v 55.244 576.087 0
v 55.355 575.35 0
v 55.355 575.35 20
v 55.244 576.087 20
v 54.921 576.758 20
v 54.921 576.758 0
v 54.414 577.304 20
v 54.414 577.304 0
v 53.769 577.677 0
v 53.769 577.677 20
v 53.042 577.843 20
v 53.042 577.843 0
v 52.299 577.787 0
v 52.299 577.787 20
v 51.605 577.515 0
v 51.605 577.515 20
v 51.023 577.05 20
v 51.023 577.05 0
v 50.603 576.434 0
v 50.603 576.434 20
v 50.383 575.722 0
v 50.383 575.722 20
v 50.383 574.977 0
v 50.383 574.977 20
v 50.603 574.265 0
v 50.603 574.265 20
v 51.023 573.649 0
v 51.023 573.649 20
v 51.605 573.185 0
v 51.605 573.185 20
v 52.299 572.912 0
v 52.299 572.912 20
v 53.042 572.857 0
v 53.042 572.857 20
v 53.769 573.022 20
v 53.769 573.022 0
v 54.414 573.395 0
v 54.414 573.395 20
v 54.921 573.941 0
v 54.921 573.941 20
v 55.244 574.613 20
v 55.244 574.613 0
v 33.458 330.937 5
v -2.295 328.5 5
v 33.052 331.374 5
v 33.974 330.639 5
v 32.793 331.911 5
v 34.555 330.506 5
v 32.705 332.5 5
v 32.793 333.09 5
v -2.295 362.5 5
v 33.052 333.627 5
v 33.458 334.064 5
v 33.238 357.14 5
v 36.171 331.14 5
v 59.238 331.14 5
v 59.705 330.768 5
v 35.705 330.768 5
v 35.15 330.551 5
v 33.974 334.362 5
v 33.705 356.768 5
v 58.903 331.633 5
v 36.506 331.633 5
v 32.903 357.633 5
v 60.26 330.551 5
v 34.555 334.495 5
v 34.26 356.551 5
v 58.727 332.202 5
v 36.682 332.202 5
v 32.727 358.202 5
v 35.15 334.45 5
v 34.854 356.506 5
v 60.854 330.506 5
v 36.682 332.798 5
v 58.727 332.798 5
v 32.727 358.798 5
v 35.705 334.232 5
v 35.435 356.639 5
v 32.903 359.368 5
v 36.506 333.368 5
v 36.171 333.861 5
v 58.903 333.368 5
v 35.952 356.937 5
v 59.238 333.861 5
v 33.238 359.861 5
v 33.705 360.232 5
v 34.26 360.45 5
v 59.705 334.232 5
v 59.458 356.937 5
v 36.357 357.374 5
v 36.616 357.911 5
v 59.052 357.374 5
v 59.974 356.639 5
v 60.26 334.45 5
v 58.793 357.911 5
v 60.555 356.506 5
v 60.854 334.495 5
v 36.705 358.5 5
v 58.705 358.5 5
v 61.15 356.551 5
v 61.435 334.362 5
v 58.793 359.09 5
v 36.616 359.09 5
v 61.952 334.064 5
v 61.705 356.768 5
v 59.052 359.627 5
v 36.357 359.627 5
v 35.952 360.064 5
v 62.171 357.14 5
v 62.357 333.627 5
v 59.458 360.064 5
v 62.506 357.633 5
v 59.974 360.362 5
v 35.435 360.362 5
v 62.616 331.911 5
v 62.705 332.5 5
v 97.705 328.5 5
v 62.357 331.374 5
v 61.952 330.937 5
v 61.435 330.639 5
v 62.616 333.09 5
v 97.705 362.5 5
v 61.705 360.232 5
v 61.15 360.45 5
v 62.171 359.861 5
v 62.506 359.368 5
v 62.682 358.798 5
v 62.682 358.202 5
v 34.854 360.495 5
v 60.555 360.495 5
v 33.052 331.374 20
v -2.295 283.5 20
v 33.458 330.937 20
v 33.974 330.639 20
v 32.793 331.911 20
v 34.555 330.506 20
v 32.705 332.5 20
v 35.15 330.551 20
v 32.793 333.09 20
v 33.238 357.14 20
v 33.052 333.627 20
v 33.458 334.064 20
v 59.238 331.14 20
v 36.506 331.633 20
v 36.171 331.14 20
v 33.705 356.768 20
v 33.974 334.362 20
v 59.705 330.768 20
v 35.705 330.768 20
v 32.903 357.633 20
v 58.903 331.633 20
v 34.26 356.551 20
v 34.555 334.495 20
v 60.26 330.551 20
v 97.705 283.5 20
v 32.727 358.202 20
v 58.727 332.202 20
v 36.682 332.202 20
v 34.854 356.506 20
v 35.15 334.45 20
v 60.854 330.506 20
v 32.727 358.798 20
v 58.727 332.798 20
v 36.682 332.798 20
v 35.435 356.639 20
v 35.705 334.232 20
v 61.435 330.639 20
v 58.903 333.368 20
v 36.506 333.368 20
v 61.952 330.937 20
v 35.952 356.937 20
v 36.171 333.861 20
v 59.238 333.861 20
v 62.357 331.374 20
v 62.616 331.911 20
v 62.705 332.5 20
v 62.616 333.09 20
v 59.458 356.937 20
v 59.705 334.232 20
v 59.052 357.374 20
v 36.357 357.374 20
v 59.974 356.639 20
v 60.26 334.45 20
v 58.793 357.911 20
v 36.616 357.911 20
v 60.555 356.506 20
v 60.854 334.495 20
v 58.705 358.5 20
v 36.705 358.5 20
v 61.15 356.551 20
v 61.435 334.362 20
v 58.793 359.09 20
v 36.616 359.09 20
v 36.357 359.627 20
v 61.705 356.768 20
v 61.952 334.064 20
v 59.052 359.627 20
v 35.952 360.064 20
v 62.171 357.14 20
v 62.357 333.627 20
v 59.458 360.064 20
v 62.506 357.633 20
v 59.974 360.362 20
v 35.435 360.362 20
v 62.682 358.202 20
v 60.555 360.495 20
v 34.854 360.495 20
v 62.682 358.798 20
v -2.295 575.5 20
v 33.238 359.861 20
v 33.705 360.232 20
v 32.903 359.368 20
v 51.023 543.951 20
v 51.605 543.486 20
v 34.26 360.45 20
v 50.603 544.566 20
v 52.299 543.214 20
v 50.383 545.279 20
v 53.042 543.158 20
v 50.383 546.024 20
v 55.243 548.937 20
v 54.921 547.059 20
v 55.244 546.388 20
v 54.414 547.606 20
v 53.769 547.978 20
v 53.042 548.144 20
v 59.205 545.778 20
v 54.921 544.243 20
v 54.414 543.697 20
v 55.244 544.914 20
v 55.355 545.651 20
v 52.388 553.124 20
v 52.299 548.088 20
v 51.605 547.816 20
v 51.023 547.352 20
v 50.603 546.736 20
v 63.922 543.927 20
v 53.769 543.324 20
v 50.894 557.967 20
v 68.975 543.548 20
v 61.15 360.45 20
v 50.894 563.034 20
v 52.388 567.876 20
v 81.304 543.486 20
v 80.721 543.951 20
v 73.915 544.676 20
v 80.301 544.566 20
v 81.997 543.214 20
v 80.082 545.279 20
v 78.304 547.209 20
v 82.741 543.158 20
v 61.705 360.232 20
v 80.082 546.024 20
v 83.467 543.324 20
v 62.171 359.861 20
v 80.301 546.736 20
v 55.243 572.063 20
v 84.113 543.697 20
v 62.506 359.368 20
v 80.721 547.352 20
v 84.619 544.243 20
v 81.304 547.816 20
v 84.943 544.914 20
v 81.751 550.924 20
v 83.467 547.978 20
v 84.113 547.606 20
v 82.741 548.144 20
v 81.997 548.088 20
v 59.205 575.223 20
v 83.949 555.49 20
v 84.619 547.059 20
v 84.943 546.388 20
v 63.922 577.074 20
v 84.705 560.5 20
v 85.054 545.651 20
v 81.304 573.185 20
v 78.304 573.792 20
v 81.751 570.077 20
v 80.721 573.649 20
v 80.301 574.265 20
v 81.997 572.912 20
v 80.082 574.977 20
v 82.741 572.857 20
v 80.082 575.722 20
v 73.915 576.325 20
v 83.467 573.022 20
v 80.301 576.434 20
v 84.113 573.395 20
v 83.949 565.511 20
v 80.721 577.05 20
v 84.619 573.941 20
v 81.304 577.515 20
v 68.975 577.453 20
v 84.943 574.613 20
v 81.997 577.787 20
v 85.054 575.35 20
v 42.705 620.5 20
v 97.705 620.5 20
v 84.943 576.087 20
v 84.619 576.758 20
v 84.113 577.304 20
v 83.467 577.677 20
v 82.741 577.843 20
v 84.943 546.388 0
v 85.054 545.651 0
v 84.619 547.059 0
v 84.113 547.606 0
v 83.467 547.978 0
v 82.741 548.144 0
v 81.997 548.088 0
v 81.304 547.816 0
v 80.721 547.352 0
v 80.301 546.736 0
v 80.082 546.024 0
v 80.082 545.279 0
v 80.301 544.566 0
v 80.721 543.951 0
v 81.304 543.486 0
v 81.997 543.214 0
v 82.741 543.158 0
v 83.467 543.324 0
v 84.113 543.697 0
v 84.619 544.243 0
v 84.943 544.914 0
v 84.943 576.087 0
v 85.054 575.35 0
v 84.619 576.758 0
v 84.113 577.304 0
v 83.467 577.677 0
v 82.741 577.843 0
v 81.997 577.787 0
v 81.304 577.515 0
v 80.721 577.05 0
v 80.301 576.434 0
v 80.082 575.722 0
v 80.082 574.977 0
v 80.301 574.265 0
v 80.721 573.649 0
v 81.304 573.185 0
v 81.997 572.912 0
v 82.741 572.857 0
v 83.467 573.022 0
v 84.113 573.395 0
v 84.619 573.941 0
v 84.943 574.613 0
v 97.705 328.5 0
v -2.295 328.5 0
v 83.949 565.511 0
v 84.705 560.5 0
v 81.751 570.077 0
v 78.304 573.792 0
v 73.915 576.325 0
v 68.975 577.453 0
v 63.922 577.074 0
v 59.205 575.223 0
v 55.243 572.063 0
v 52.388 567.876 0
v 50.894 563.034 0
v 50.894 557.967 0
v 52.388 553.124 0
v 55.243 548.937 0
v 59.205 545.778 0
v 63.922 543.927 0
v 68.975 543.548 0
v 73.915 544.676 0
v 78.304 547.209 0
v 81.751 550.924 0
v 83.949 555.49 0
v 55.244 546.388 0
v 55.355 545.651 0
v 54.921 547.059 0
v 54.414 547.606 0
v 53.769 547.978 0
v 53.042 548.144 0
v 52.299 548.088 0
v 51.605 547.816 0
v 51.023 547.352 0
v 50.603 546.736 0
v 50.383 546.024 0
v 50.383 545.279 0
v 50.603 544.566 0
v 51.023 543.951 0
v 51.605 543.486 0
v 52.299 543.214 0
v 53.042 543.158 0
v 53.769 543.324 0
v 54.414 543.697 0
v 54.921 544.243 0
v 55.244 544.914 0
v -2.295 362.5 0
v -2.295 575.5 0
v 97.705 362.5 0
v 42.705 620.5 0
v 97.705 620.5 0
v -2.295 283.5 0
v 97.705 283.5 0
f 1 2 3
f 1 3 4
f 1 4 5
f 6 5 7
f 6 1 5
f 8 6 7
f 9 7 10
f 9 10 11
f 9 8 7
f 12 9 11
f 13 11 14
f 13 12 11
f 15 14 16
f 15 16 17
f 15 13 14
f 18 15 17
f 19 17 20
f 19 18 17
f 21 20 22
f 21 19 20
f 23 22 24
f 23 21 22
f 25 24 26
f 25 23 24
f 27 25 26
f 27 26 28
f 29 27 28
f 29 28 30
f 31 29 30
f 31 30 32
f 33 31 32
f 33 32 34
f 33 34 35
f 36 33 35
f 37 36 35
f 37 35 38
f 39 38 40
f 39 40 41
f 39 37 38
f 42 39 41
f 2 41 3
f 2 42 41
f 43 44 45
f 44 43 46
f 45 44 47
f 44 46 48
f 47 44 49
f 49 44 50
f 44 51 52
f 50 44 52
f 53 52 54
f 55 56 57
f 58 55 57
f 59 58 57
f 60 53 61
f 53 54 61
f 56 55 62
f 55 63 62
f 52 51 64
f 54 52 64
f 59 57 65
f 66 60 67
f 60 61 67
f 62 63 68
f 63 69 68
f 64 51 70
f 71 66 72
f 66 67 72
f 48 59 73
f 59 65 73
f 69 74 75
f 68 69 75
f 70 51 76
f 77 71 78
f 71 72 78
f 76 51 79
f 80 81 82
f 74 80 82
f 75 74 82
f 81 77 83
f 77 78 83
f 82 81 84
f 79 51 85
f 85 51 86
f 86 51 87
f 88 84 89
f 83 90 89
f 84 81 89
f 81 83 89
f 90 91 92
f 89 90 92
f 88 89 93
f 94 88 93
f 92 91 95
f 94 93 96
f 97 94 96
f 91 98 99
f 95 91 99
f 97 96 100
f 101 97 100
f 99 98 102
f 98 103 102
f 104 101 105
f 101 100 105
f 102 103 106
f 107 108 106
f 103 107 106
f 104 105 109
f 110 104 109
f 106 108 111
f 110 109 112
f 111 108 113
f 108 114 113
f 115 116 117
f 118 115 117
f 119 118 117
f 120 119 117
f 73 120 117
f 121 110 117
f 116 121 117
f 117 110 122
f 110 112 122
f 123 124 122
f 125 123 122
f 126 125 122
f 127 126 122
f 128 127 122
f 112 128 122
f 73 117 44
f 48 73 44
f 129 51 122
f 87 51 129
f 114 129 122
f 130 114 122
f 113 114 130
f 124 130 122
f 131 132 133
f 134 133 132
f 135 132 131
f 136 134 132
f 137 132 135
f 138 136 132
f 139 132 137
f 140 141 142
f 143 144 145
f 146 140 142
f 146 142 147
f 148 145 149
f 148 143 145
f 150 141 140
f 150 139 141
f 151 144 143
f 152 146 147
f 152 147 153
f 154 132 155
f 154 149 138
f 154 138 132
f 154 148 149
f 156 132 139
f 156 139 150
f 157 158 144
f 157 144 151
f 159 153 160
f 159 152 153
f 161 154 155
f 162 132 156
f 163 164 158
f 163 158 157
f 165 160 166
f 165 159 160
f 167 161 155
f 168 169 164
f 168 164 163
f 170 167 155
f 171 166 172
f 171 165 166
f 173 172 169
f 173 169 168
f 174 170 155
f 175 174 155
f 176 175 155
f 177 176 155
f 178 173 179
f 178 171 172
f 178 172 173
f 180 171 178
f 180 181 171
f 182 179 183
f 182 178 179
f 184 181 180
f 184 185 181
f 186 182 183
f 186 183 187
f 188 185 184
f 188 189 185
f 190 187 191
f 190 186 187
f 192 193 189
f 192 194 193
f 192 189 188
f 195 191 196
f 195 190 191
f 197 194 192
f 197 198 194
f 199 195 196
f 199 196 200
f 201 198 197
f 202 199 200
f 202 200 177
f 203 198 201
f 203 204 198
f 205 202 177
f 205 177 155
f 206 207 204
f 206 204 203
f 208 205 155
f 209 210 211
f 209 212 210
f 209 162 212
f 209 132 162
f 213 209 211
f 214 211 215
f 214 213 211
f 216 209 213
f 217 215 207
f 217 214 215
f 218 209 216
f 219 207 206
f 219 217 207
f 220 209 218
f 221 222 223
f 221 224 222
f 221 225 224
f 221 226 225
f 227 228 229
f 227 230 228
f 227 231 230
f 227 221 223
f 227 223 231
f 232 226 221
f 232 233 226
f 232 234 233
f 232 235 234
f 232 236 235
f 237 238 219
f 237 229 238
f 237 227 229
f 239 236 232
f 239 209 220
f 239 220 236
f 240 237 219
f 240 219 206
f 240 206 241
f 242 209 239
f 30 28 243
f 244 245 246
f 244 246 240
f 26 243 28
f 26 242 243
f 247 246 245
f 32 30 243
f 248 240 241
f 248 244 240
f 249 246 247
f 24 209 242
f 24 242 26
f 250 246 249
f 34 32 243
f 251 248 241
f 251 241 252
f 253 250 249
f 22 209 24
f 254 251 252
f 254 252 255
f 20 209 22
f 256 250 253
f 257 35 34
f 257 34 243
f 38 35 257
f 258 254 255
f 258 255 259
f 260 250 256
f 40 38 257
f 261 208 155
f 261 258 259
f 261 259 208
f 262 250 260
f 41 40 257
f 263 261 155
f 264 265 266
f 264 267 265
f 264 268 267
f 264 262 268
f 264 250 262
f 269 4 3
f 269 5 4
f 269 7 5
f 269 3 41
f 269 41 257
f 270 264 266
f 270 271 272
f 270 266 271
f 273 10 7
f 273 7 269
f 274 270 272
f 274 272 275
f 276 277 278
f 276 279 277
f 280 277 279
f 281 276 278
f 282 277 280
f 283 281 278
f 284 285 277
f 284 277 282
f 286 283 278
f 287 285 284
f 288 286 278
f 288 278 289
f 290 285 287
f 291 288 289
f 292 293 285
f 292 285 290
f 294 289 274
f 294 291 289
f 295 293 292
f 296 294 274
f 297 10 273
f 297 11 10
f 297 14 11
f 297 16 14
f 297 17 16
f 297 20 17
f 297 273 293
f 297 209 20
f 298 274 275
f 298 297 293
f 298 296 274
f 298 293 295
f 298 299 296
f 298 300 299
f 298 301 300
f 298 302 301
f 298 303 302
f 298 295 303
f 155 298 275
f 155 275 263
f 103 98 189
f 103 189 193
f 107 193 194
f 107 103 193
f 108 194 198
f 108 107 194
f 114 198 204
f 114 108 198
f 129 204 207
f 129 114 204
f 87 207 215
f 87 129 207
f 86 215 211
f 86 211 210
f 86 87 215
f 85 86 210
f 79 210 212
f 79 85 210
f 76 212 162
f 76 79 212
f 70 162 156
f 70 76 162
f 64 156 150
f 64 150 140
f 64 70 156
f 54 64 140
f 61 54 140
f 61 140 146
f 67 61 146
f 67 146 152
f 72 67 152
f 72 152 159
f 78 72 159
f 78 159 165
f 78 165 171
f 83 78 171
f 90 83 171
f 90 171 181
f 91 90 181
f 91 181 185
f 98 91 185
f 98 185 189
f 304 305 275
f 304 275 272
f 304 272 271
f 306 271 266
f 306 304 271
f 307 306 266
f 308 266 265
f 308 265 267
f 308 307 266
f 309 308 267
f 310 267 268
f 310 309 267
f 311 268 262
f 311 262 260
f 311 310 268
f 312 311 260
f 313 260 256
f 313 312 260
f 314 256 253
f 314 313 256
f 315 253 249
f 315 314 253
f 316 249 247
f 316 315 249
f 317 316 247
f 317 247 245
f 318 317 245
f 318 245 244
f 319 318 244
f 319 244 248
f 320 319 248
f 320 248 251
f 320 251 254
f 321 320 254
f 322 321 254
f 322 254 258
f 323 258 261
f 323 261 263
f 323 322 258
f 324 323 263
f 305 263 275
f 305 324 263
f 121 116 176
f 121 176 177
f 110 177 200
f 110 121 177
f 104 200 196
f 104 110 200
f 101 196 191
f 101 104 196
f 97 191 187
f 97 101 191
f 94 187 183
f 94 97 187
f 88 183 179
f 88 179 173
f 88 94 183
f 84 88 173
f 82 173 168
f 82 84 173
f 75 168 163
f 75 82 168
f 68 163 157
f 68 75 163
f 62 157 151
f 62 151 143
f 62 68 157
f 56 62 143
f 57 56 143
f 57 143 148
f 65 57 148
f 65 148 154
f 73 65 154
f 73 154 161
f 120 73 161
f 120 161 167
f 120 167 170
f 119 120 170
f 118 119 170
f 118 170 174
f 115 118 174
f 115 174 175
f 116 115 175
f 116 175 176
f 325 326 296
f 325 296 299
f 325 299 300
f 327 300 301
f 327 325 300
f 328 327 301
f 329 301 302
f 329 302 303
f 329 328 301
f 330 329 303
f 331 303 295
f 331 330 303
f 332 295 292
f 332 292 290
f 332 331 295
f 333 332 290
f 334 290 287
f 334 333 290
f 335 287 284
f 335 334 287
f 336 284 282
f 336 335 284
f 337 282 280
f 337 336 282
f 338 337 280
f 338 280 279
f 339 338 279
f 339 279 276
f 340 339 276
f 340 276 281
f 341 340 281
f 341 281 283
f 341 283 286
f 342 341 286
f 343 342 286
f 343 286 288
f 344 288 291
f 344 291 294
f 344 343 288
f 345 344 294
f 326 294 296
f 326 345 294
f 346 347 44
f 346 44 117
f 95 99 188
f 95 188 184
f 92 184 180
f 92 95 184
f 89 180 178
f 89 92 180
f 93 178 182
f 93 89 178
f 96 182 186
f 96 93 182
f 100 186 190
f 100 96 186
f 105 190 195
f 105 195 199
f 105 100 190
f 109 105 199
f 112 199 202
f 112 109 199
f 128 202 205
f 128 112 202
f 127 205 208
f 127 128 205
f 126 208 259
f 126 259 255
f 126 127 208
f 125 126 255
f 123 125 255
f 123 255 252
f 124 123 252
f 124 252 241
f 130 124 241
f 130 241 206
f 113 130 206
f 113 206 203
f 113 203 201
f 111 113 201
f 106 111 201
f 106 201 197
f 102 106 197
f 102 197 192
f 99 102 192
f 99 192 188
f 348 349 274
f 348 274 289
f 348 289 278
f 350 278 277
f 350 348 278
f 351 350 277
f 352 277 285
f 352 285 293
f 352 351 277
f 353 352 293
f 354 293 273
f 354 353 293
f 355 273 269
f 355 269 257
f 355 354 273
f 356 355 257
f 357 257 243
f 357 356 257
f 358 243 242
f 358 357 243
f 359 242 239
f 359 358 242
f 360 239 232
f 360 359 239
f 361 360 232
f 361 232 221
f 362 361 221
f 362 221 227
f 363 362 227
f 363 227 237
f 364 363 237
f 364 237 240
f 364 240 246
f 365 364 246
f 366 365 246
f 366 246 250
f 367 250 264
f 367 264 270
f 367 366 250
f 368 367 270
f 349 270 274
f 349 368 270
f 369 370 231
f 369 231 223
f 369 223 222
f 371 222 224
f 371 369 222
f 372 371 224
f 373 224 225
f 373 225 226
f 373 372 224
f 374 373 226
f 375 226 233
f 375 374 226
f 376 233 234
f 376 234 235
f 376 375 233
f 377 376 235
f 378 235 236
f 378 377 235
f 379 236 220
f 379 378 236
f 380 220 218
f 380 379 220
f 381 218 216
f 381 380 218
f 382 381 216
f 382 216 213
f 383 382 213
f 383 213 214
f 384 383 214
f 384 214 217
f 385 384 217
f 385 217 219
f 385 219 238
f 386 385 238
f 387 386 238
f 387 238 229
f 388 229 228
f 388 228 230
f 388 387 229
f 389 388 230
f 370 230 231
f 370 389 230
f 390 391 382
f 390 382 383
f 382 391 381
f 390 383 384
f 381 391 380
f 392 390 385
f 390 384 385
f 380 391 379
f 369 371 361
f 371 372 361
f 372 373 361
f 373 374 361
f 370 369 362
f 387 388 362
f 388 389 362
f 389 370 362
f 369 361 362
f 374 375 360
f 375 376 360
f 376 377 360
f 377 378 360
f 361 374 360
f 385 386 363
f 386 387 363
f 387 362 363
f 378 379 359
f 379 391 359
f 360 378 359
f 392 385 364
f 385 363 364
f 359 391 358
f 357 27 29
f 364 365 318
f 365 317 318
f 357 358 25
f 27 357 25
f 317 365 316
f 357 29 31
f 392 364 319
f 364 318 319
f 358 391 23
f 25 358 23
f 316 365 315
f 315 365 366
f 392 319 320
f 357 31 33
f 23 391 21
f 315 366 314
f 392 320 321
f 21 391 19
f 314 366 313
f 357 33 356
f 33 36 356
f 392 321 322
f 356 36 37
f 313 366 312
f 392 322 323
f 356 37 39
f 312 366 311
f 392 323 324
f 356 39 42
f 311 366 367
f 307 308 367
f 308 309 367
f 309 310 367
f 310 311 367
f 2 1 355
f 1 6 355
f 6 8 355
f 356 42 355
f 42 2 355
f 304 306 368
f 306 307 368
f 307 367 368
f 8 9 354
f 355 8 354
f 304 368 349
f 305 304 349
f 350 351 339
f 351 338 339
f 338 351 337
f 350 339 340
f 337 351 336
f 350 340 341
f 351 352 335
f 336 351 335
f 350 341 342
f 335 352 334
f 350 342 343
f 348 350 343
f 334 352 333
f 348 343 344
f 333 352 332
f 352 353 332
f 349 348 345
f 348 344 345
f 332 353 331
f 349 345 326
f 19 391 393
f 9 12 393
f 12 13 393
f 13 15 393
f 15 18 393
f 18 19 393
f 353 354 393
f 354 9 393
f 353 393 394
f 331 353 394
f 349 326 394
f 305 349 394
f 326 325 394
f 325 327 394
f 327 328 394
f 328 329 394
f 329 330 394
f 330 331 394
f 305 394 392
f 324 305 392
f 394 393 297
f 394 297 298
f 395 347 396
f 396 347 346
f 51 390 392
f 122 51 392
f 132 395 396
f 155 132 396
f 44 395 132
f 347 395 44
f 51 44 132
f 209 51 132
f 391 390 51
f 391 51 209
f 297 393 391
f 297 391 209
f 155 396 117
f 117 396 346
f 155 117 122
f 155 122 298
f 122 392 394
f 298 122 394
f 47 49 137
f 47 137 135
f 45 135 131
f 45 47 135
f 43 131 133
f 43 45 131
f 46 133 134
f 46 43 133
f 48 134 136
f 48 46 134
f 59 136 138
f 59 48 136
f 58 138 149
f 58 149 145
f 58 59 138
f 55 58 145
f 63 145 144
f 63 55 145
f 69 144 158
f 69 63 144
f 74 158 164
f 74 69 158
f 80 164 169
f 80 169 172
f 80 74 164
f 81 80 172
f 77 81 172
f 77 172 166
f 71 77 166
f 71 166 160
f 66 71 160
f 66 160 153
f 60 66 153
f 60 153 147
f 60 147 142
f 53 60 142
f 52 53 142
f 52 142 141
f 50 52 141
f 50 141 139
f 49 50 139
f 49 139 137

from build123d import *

# Parameters (mm, degrees)
SKETCH1_W           = 100
SKETCH1_H           = 337
SKETCH1_R           = 17
SKETCH1_R_2         = 2.5
SKETCH1_R_3         = 2
BOSS_EXTRUDE1_DEPTH = 20
CHAMFER1_SIZE       = 45
SKETCH2_W           = 100
SKETCH2_H           = 34
CUT_EXTRUDE1_DEPTH  = 5


with BuildPart() as part:
    # Sketch1 → Boss-Extrude1 (new body)
    with BuildSketch(Plane.XY):
        with Locations((47.704546062, 452.000370419)):
            Rectangle(SKETCH1_W, SKETCH1_H)
        with Locations((67.704546062, 560.500370419)):
            Circle(SKETCH1_R, mode=Mode.SUBTRACT)
        with Locations((82.553788467, 575.349612824)):
            Circle(SKETCH1_R_2, mode=Mode.SUBTRACT)
        with Locations((82.553788467, 545.651128014)):
            Circle(SKETCH1_R_2, mode=Mode.SUBTRACT)
        with Locations((52.855303657, 545.651128014)):
            Circle(SKETCH1_R_2, mode=Mode.SUBTRACT)
        with Locations((52.855303657, 575.349612824)):
            Circle(SKETCH1_R_2, mode=Mode.SUBTRACT)
        with Locations((34.704546062, 358.500370419)):
            Circle(SKETCH1_R_3, mode=Mode.SUBTRACT)
        with Locations(Location((60.704546062, 358.500370419, 0), (0, 0, 180))):
            Circle(SKETCH1_R_3, mode=Mode.SUBTRACT)
        with Locations((60.704546062, 332.500370419)):
            Circle(SKETCH1_R_3, mode=Mode.SUBTRACT)
        with Locations(Location((34.704546062, 332.500370419, 0), (0, 0, 180))):
            Circle(SKETCH1_R_3, mode=Mode.SUBTRACT)
    extrude(amount=BOSS_EXTRUDE1_DEPTH)

    # Chamfer1
    chamfer1_edges = [part.edges().sort_by_distance(p)[0] for p in [
        (-2.295453938, 620.500370419, 10),
    ]]
    chamfer(chamfer1_edges, length=CHAMFER1_SIZE)

    # Sketch2 → Cut-Extrude1 (cut)
    with BuildSketch(Plane.XY):
        with Locations((47.704546062, 345.500370419)):
            Rectangle(SKETCH2_W, SKETCH2_H)
    extrude(amount=CUT_EXTRUDE1_DEPTH, mode=Mode.SUBTRACT)


solid = part.part
